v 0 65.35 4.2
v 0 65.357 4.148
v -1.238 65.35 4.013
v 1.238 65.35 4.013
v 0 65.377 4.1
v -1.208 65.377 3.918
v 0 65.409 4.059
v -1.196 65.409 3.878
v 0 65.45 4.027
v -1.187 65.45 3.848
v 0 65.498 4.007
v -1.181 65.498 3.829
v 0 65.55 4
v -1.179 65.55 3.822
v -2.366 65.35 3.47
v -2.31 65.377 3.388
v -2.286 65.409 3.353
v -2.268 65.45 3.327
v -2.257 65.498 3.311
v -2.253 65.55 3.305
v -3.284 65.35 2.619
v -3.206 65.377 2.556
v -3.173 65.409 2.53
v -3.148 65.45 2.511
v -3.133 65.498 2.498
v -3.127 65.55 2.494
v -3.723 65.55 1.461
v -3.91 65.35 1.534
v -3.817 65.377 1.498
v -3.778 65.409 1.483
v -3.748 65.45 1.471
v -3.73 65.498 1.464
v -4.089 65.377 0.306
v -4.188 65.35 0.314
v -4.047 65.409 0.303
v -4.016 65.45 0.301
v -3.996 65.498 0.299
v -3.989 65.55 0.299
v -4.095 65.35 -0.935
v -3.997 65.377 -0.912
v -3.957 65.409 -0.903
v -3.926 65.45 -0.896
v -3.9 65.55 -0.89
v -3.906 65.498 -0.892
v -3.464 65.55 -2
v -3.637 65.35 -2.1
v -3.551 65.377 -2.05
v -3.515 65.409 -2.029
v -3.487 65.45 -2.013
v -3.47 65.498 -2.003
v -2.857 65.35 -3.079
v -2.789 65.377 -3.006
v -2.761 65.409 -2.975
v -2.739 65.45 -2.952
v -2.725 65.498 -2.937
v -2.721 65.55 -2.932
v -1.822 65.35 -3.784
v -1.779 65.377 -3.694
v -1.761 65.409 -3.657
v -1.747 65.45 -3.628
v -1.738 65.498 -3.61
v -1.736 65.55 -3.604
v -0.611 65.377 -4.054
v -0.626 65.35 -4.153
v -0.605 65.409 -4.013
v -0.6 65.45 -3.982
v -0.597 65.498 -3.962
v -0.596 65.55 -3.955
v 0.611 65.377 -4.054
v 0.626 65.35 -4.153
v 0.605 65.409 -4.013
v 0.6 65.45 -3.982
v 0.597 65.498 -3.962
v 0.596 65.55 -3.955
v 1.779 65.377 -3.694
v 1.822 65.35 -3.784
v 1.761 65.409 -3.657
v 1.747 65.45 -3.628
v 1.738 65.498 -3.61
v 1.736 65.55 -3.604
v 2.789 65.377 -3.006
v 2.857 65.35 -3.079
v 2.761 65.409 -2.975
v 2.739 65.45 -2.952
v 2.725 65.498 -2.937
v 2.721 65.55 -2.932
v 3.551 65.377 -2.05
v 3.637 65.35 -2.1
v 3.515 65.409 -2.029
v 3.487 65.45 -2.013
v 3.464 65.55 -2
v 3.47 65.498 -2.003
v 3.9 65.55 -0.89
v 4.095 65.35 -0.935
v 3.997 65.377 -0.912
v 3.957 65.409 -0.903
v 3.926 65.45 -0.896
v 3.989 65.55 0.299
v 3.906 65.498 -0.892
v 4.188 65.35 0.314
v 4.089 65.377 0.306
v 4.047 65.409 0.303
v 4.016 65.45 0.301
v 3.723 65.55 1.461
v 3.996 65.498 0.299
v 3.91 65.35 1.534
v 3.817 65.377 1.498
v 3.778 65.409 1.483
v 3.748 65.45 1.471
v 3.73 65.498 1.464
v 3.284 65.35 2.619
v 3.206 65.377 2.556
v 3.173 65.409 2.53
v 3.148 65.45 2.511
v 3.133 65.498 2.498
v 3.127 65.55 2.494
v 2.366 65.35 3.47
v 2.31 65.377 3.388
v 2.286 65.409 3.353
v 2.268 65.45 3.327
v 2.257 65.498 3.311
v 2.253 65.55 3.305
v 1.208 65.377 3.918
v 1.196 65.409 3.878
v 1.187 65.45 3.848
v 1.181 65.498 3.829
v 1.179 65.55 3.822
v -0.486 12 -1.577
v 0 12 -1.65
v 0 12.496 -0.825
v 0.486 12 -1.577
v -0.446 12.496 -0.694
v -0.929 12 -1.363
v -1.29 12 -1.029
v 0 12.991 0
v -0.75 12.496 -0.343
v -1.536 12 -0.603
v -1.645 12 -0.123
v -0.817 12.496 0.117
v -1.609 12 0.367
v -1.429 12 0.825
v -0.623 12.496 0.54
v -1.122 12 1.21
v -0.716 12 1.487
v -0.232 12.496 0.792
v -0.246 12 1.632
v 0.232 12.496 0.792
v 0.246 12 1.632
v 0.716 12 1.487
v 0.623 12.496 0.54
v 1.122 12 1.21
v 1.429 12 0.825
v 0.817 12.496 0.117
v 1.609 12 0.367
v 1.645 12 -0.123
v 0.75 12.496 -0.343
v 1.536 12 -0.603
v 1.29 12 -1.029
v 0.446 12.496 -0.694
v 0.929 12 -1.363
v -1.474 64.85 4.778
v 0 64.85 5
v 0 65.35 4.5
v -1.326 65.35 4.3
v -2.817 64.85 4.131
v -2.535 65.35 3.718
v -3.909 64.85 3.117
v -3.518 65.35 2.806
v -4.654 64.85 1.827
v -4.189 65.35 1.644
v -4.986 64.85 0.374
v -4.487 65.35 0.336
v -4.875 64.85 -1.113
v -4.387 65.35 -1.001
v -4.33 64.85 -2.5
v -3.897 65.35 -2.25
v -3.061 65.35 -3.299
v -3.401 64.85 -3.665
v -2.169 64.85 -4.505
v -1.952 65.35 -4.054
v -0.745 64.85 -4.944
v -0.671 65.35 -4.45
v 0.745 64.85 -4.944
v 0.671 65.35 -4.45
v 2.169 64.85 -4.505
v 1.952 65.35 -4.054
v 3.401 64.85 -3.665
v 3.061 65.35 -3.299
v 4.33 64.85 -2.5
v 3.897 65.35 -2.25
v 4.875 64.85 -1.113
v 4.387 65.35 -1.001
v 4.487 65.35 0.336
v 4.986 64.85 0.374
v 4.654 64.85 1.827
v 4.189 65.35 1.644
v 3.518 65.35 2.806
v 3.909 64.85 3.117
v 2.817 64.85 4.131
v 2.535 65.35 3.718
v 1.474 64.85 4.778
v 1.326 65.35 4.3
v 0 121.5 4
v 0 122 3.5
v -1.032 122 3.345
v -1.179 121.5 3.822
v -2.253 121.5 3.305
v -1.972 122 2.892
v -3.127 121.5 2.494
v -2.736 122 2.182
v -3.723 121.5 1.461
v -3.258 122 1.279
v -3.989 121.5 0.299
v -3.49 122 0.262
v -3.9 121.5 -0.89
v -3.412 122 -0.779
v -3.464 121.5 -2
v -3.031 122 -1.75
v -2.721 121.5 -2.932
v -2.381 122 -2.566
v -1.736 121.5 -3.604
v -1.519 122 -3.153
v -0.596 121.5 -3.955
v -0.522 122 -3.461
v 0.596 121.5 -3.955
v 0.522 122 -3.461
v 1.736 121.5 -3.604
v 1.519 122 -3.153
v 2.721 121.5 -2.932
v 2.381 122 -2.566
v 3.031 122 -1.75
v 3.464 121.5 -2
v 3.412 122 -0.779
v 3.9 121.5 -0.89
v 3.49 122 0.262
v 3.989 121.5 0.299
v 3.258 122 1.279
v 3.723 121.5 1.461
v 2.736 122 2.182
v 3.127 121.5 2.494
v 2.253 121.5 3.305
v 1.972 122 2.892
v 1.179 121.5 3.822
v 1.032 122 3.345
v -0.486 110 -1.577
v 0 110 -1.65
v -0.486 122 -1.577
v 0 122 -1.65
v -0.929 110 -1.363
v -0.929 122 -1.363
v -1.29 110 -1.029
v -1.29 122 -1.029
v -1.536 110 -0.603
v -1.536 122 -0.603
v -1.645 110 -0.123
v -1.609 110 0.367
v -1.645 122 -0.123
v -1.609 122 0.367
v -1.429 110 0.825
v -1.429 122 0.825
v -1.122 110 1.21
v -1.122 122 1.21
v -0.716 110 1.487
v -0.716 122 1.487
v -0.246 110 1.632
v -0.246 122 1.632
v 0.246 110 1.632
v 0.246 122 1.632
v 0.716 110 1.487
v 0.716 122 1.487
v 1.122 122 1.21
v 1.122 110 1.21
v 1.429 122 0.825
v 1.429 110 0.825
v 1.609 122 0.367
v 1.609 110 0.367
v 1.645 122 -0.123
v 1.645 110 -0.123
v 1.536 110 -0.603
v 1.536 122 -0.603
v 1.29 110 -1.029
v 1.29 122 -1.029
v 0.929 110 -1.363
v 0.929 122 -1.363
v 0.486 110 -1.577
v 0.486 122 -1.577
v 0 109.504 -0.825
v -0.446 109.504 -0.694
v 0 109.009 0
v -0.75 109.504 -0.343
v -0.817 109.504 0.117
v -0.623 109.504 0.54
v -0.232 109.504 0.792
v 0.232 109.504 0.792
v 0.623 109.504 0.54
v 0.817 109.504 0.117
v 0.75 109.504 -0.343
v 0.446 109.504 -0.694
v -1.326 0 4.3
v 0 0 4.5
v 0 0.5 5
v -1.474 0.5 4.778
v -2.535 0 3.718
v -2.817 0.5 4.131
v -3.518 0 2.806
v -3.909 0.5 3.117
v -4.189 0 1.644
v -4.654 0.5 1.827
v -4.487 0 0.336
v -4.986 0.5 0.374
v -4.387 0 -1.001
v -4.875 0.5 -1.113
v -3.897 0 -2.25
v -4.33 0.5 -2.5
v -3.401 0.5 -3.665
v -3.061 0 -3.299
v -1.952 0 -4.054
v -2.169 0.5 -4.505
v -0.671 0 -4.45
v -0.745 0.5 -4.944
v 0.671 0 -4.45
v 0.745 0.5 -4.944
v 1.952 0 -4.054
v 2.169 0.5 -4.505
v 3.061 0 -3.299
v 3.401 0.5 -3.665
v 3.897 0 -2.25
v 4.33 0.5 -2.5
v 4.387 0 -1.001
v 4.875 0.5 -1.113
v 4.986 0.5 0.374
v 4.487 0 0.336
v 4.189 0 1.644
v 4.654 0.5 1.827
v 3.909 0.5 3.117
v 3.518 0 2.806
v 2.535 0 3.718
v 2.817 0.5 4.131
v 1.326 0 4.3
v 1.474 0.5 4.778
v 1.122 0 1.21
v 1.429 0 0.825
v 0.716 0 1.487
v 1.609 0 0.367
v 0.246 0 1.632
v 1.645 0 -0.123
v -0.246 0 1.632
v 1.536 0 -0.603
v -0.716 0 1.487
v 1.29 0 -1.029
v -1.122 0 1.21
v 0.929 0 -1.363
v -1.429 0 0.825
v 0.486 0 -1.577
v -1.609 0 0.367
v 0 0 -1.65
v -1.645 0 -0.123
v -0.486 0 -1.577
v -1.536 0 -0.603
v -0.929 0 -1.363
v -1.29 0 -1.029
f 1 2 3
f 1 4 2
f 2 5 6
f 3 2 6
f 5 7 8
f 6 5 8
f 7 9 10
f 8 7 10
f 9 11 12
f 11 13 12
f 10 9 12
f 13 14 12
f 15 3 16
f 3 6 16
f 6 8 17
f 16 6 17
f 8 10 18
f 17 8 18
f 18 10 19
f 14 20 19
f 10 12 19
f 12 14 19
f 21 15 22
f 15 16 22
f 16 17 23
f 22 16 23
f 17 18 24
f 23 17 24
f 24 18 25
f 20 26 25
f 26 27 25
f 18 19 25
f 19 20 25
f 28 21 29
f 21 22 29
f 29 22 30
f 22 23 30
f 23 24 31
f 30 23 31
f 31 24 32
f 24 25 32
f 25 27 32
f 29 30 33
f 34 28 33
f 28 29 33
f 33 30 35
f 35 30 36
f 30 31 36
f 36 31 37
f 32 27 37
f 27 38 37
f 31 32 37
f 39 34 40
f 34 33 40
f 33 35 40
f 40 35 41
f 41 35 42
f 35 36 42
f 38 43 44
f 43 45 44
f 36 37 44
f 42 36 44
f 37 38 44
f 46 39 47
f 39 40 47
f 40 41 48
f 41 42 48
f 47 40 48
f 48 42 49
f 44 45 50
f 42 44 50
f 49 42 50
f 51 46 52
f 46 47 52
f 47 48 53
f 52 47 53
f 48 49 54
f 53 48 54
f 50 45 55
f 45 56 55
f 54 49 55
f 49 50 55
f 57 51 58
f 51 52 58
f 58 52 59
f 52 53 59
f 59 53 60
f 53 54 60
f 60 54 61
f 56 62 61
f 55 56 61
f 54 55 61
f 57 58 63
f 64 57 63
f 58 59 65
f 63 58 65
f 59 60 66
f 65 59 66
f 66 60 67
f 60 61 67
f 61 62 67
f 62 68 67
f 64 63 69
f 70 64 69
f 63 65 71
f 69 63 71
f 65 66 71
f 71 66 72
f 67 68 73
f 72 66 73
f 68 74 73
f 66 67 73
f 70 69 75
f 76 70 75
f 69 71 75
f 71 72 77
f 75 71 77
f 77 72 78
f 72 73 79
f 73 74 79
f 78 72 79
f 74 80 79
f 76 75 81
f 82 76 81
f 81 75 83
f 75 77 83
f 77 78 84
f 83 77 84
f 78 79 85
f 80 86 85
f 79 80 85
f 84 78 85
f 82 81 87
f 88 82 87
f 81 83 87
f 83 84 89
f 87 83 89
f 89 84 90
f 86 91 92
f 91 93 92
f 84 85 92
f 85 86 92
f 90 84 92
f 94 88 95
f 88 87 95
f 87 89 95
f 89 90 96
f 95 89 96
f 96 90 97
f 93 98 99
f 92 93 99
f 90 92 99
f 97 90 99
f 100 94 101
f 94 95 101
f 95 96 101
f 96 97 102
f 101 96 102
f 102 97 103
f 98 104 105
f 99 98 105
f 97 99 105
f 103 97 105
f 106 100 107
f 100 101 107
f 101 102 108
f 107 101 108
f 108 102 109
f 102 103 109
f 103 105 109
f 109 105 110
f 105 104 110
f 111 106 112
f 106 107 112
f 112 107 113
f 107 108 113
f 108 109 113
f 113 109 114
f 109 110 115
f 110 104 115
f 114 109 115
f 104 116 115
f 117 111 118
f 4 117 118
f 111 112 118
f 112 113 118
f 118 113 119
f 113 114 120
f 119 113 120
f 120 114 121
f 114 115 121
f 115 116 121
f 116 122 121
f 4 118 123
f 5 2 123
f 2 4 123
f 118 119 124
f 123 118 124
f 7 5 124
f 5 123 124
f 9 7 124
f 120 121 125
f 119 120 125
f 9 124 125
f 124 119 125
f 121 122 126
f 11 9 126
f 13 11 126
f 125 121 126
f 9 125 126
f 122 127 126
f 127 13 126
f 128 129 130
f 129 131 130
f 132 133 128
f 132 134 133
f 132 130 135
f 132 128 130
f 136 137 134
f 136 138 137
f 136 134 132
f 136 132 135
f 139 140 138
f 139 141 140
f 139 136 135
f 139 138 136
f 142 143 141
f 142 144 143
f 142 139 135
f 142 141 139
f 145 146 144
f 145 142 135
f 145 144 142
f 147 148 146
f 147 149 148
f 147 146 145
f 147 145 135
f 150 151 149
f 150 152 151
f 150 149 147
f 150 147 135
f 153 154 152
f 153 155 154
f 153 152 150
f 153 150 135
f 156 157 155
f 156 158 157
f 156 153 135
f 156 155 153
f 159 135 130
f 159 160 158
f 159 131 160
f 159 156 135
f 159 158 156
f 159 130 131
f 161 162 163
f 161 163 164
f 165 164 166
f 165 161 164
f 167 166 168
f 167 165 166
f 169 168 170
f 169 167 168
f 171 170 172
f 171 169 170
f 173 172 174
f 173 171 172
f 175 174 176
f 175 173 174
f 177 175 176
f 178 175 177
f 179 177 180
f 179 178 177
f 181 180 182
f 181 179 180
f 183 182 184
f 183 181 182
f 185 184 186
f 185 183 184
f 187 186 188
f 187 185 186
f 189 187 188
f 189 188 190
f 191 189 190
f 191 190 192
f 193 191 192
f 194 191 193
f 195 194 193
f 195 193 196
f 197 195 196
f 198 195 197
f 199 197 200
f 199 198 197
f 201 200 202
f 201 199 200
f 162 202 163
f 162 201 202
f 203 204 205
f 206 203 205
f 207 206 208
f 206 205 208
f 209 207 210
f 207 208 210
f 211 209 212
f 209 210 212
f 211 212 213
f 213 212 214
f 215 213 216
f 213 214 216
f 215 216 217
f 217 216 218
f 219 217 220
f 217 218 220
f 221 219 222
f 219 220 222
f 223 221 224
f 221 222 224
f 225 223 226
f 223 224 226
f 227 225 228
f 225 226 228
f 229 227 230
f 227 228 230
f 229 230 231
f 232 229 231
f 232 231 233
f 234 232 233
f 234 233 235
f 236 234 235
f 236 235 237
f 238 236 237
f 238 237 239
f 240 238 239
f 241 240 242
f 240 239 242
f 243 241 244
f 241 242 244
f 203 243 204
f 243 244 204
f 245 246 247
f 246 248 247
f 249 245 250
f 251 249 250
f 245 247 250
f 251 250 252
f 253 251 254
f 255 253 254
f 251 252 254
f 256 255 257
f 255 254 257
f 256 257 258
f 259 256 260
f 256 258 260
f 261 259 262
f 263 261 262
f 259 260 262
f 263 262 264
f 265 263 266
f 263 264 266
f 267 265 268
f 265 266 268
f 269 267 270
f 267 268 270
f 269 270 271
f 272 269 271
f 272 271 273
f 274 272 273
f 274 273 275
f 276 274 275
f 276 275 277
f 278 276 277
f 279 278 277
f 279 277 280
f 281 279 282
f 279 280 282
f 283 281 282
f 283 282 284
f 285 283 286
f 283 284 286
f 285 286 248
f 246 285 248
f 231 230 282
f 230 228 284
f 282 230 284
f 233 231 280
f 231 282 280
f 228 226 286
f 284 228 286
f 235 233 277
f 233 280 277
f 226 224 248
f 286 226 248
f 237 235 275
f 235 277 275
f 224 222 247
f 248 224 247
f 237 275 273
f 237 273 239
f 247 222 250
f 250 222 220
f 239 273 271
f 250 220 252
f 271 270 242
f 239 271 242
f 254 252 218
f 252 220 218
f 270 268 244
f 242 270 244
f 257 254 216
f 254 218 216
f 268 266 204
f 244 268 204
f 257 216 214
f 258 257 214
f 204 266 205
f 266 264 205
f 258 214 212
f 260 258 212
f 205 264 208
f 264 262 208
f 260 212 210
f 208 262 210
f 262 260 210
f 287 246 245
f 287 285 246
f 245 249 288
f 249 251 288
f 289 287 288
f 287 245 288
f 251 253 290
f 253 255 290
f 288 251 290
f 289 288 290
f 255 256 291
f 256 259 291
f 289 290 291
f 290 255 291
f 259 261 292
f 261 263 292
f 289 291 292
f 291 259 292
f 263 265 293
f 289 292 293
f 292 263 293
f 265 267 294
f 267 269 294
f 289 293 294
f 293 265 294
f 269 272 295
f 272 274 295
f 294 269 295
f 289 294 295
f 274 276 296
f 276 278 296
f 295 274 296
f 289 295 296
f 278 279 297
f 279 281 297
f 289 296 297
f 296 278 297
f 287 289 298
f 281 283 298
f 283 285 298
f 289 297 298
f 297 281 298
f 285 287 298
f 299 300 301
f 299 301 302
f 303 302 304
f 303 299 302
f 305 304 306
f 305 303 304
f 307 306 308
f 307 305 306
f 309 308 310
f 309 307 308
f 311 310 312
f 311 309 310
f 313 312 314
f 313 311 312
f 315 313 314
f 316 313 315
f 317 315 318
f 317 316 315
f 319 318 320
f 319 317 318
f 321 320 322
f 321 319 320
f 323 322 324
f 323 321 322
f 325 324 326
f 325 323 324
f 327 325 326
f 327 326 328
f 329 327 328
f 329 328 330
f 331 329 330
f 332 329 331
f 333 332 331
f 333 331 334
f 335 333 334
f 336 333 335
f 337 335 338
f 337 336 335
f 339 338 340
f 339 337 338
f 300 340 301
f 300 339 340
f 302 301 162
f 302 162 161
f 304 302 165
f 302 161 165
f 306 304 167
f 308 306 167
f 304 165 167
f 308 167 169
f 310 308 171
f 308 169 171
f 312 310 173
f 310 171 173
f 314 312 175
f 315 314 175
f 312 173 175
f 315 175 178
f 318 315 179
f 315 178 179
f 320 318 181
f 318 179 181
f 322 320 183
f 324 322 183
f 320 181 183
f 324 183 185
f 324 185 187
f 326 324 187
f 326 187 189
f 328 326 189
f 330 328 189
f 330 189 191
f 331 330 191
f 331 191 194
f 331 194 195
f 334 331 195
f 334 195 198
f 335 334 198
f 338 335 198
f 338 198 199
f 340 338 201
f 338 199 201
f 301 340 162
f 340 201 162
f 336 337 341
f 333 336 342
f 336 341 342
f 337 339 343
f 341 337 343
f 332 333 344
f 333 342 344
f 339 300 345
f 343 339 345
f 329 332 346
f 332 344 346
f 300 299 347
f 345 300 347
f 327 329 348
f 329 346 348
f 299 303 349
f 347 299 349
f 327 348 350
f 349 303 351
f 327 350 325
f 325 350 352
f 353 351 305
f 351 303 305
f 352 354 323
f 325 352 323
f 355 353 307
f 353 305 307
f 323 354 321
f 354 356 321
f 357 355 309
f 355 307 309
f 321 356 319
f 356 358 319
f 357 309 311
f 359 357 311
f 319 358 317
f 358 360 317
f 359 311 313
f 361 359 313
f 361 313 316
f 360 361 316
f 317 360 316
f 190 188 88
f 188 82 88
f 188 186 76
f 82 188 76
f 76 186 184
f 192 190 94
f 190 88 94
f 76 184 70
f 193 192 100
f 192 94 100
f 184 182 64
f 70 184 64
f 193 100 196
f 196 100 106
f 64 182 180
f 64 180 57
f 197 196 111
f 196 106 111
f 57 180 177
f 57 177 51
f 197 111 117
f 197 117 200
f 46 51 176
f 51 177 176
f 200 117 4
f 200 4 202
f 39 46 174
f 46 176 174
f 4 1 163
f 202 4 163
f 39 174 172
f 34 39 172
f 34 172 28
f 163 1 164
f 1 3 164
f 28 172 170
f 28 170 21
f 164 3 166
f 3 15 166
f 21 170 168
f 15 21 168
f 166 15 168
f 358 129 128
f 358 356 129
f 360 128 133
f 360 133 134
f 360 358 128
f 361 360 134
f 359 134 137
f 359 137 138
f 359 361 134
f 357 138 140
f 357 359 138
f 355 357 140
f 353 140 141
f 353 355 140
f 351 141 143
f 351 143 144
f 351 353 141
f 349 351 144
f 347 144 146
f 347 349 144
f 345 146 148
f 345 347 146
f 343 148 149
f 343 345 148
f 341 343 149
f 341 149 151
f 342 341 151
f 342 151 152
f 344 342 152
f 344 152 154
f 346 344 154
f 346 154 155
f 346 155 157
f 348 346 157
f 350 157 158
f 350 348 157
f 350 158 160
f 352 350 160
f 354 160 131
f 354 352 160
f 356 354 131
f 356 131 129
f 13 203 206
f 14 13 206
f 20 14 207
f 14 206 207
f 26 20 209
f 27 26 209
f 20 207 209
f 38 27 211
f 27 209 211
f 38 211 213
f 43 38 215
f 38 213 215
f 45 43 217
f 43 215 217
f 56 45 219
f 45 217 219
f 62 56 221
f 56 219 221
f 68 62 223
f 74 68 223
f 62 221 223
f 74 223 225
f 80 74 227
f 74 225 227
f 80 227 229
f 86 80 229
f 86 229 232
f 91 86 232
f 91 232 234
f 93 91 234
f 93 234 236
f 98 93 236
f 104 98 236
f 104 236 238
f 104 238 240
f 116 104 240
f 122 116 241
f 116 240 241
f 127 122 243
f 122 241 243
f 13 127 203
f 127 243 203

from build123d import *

# Parameters (mm, degrees)
FILLET1_R     = 0.2
CHAMFER1_SIZE = 0.5


with BuildPart() as part:
    # Sketch1 → Revolve1 (revolve)
    with BuildSketch(Plane.XY, mode=Mode.PRIVATE) as revolve1_sk:
        Polygon((0, 0), (5, 0), (5, 65.35), (4, 65.35), (4, 122), (0, 122), align=None)
    revolve(revolve1_sk.sketch.rotate(Axis((0, 7.476190476, 0), (0, -1, 0)), 90), axis=Axis((0, 7.476190476, 0), (0, -1, 0)))

    # Sketch4 → M4 Tapped Hole1 (revolve, cut)
    with BuildSketch(Plane(origin=(0, 0, 0), x_dir=(0, 0, -1), z_dir=(1, 0, 0))):
        Polygon((0, 0), (0, 12.991420021), (1.65, 12), (1.65, 0), align=None)
    m4_tapped_hole1 = revolve(axis=Axis((0, -6.35, 0), (0, 1, 0)), mode=Mode.SUBTRACT)

    # Mirror1: M4 Tapped Hole1 across plane
    add(m4_tapped_hole1.mirror(Plane(origin=(0, 61, 0), x_dir=(0, 0, 1), z_dir=(0, -1, 0))), mode=Mode.SUBTRACT)

    # Fillet1
    fillet1_edges = [part.edges().sort_by_distance(p)[0] for p in [
        (0, 65.35, -4),
    ]]
    fillet(fillet1_edges, radius=FILLET1_R)

    # Chamfer1
    chamfer1_edges = [part.edges().sort_by_distance(p)[0] for p in [
        (0, 122, -4),
        (0, 65.35, -5),
        (0, 0, -5),
    ]]
    chamfer(chamfer1_edges, length=CHAMFER1_SIZE)


solid = part.part
